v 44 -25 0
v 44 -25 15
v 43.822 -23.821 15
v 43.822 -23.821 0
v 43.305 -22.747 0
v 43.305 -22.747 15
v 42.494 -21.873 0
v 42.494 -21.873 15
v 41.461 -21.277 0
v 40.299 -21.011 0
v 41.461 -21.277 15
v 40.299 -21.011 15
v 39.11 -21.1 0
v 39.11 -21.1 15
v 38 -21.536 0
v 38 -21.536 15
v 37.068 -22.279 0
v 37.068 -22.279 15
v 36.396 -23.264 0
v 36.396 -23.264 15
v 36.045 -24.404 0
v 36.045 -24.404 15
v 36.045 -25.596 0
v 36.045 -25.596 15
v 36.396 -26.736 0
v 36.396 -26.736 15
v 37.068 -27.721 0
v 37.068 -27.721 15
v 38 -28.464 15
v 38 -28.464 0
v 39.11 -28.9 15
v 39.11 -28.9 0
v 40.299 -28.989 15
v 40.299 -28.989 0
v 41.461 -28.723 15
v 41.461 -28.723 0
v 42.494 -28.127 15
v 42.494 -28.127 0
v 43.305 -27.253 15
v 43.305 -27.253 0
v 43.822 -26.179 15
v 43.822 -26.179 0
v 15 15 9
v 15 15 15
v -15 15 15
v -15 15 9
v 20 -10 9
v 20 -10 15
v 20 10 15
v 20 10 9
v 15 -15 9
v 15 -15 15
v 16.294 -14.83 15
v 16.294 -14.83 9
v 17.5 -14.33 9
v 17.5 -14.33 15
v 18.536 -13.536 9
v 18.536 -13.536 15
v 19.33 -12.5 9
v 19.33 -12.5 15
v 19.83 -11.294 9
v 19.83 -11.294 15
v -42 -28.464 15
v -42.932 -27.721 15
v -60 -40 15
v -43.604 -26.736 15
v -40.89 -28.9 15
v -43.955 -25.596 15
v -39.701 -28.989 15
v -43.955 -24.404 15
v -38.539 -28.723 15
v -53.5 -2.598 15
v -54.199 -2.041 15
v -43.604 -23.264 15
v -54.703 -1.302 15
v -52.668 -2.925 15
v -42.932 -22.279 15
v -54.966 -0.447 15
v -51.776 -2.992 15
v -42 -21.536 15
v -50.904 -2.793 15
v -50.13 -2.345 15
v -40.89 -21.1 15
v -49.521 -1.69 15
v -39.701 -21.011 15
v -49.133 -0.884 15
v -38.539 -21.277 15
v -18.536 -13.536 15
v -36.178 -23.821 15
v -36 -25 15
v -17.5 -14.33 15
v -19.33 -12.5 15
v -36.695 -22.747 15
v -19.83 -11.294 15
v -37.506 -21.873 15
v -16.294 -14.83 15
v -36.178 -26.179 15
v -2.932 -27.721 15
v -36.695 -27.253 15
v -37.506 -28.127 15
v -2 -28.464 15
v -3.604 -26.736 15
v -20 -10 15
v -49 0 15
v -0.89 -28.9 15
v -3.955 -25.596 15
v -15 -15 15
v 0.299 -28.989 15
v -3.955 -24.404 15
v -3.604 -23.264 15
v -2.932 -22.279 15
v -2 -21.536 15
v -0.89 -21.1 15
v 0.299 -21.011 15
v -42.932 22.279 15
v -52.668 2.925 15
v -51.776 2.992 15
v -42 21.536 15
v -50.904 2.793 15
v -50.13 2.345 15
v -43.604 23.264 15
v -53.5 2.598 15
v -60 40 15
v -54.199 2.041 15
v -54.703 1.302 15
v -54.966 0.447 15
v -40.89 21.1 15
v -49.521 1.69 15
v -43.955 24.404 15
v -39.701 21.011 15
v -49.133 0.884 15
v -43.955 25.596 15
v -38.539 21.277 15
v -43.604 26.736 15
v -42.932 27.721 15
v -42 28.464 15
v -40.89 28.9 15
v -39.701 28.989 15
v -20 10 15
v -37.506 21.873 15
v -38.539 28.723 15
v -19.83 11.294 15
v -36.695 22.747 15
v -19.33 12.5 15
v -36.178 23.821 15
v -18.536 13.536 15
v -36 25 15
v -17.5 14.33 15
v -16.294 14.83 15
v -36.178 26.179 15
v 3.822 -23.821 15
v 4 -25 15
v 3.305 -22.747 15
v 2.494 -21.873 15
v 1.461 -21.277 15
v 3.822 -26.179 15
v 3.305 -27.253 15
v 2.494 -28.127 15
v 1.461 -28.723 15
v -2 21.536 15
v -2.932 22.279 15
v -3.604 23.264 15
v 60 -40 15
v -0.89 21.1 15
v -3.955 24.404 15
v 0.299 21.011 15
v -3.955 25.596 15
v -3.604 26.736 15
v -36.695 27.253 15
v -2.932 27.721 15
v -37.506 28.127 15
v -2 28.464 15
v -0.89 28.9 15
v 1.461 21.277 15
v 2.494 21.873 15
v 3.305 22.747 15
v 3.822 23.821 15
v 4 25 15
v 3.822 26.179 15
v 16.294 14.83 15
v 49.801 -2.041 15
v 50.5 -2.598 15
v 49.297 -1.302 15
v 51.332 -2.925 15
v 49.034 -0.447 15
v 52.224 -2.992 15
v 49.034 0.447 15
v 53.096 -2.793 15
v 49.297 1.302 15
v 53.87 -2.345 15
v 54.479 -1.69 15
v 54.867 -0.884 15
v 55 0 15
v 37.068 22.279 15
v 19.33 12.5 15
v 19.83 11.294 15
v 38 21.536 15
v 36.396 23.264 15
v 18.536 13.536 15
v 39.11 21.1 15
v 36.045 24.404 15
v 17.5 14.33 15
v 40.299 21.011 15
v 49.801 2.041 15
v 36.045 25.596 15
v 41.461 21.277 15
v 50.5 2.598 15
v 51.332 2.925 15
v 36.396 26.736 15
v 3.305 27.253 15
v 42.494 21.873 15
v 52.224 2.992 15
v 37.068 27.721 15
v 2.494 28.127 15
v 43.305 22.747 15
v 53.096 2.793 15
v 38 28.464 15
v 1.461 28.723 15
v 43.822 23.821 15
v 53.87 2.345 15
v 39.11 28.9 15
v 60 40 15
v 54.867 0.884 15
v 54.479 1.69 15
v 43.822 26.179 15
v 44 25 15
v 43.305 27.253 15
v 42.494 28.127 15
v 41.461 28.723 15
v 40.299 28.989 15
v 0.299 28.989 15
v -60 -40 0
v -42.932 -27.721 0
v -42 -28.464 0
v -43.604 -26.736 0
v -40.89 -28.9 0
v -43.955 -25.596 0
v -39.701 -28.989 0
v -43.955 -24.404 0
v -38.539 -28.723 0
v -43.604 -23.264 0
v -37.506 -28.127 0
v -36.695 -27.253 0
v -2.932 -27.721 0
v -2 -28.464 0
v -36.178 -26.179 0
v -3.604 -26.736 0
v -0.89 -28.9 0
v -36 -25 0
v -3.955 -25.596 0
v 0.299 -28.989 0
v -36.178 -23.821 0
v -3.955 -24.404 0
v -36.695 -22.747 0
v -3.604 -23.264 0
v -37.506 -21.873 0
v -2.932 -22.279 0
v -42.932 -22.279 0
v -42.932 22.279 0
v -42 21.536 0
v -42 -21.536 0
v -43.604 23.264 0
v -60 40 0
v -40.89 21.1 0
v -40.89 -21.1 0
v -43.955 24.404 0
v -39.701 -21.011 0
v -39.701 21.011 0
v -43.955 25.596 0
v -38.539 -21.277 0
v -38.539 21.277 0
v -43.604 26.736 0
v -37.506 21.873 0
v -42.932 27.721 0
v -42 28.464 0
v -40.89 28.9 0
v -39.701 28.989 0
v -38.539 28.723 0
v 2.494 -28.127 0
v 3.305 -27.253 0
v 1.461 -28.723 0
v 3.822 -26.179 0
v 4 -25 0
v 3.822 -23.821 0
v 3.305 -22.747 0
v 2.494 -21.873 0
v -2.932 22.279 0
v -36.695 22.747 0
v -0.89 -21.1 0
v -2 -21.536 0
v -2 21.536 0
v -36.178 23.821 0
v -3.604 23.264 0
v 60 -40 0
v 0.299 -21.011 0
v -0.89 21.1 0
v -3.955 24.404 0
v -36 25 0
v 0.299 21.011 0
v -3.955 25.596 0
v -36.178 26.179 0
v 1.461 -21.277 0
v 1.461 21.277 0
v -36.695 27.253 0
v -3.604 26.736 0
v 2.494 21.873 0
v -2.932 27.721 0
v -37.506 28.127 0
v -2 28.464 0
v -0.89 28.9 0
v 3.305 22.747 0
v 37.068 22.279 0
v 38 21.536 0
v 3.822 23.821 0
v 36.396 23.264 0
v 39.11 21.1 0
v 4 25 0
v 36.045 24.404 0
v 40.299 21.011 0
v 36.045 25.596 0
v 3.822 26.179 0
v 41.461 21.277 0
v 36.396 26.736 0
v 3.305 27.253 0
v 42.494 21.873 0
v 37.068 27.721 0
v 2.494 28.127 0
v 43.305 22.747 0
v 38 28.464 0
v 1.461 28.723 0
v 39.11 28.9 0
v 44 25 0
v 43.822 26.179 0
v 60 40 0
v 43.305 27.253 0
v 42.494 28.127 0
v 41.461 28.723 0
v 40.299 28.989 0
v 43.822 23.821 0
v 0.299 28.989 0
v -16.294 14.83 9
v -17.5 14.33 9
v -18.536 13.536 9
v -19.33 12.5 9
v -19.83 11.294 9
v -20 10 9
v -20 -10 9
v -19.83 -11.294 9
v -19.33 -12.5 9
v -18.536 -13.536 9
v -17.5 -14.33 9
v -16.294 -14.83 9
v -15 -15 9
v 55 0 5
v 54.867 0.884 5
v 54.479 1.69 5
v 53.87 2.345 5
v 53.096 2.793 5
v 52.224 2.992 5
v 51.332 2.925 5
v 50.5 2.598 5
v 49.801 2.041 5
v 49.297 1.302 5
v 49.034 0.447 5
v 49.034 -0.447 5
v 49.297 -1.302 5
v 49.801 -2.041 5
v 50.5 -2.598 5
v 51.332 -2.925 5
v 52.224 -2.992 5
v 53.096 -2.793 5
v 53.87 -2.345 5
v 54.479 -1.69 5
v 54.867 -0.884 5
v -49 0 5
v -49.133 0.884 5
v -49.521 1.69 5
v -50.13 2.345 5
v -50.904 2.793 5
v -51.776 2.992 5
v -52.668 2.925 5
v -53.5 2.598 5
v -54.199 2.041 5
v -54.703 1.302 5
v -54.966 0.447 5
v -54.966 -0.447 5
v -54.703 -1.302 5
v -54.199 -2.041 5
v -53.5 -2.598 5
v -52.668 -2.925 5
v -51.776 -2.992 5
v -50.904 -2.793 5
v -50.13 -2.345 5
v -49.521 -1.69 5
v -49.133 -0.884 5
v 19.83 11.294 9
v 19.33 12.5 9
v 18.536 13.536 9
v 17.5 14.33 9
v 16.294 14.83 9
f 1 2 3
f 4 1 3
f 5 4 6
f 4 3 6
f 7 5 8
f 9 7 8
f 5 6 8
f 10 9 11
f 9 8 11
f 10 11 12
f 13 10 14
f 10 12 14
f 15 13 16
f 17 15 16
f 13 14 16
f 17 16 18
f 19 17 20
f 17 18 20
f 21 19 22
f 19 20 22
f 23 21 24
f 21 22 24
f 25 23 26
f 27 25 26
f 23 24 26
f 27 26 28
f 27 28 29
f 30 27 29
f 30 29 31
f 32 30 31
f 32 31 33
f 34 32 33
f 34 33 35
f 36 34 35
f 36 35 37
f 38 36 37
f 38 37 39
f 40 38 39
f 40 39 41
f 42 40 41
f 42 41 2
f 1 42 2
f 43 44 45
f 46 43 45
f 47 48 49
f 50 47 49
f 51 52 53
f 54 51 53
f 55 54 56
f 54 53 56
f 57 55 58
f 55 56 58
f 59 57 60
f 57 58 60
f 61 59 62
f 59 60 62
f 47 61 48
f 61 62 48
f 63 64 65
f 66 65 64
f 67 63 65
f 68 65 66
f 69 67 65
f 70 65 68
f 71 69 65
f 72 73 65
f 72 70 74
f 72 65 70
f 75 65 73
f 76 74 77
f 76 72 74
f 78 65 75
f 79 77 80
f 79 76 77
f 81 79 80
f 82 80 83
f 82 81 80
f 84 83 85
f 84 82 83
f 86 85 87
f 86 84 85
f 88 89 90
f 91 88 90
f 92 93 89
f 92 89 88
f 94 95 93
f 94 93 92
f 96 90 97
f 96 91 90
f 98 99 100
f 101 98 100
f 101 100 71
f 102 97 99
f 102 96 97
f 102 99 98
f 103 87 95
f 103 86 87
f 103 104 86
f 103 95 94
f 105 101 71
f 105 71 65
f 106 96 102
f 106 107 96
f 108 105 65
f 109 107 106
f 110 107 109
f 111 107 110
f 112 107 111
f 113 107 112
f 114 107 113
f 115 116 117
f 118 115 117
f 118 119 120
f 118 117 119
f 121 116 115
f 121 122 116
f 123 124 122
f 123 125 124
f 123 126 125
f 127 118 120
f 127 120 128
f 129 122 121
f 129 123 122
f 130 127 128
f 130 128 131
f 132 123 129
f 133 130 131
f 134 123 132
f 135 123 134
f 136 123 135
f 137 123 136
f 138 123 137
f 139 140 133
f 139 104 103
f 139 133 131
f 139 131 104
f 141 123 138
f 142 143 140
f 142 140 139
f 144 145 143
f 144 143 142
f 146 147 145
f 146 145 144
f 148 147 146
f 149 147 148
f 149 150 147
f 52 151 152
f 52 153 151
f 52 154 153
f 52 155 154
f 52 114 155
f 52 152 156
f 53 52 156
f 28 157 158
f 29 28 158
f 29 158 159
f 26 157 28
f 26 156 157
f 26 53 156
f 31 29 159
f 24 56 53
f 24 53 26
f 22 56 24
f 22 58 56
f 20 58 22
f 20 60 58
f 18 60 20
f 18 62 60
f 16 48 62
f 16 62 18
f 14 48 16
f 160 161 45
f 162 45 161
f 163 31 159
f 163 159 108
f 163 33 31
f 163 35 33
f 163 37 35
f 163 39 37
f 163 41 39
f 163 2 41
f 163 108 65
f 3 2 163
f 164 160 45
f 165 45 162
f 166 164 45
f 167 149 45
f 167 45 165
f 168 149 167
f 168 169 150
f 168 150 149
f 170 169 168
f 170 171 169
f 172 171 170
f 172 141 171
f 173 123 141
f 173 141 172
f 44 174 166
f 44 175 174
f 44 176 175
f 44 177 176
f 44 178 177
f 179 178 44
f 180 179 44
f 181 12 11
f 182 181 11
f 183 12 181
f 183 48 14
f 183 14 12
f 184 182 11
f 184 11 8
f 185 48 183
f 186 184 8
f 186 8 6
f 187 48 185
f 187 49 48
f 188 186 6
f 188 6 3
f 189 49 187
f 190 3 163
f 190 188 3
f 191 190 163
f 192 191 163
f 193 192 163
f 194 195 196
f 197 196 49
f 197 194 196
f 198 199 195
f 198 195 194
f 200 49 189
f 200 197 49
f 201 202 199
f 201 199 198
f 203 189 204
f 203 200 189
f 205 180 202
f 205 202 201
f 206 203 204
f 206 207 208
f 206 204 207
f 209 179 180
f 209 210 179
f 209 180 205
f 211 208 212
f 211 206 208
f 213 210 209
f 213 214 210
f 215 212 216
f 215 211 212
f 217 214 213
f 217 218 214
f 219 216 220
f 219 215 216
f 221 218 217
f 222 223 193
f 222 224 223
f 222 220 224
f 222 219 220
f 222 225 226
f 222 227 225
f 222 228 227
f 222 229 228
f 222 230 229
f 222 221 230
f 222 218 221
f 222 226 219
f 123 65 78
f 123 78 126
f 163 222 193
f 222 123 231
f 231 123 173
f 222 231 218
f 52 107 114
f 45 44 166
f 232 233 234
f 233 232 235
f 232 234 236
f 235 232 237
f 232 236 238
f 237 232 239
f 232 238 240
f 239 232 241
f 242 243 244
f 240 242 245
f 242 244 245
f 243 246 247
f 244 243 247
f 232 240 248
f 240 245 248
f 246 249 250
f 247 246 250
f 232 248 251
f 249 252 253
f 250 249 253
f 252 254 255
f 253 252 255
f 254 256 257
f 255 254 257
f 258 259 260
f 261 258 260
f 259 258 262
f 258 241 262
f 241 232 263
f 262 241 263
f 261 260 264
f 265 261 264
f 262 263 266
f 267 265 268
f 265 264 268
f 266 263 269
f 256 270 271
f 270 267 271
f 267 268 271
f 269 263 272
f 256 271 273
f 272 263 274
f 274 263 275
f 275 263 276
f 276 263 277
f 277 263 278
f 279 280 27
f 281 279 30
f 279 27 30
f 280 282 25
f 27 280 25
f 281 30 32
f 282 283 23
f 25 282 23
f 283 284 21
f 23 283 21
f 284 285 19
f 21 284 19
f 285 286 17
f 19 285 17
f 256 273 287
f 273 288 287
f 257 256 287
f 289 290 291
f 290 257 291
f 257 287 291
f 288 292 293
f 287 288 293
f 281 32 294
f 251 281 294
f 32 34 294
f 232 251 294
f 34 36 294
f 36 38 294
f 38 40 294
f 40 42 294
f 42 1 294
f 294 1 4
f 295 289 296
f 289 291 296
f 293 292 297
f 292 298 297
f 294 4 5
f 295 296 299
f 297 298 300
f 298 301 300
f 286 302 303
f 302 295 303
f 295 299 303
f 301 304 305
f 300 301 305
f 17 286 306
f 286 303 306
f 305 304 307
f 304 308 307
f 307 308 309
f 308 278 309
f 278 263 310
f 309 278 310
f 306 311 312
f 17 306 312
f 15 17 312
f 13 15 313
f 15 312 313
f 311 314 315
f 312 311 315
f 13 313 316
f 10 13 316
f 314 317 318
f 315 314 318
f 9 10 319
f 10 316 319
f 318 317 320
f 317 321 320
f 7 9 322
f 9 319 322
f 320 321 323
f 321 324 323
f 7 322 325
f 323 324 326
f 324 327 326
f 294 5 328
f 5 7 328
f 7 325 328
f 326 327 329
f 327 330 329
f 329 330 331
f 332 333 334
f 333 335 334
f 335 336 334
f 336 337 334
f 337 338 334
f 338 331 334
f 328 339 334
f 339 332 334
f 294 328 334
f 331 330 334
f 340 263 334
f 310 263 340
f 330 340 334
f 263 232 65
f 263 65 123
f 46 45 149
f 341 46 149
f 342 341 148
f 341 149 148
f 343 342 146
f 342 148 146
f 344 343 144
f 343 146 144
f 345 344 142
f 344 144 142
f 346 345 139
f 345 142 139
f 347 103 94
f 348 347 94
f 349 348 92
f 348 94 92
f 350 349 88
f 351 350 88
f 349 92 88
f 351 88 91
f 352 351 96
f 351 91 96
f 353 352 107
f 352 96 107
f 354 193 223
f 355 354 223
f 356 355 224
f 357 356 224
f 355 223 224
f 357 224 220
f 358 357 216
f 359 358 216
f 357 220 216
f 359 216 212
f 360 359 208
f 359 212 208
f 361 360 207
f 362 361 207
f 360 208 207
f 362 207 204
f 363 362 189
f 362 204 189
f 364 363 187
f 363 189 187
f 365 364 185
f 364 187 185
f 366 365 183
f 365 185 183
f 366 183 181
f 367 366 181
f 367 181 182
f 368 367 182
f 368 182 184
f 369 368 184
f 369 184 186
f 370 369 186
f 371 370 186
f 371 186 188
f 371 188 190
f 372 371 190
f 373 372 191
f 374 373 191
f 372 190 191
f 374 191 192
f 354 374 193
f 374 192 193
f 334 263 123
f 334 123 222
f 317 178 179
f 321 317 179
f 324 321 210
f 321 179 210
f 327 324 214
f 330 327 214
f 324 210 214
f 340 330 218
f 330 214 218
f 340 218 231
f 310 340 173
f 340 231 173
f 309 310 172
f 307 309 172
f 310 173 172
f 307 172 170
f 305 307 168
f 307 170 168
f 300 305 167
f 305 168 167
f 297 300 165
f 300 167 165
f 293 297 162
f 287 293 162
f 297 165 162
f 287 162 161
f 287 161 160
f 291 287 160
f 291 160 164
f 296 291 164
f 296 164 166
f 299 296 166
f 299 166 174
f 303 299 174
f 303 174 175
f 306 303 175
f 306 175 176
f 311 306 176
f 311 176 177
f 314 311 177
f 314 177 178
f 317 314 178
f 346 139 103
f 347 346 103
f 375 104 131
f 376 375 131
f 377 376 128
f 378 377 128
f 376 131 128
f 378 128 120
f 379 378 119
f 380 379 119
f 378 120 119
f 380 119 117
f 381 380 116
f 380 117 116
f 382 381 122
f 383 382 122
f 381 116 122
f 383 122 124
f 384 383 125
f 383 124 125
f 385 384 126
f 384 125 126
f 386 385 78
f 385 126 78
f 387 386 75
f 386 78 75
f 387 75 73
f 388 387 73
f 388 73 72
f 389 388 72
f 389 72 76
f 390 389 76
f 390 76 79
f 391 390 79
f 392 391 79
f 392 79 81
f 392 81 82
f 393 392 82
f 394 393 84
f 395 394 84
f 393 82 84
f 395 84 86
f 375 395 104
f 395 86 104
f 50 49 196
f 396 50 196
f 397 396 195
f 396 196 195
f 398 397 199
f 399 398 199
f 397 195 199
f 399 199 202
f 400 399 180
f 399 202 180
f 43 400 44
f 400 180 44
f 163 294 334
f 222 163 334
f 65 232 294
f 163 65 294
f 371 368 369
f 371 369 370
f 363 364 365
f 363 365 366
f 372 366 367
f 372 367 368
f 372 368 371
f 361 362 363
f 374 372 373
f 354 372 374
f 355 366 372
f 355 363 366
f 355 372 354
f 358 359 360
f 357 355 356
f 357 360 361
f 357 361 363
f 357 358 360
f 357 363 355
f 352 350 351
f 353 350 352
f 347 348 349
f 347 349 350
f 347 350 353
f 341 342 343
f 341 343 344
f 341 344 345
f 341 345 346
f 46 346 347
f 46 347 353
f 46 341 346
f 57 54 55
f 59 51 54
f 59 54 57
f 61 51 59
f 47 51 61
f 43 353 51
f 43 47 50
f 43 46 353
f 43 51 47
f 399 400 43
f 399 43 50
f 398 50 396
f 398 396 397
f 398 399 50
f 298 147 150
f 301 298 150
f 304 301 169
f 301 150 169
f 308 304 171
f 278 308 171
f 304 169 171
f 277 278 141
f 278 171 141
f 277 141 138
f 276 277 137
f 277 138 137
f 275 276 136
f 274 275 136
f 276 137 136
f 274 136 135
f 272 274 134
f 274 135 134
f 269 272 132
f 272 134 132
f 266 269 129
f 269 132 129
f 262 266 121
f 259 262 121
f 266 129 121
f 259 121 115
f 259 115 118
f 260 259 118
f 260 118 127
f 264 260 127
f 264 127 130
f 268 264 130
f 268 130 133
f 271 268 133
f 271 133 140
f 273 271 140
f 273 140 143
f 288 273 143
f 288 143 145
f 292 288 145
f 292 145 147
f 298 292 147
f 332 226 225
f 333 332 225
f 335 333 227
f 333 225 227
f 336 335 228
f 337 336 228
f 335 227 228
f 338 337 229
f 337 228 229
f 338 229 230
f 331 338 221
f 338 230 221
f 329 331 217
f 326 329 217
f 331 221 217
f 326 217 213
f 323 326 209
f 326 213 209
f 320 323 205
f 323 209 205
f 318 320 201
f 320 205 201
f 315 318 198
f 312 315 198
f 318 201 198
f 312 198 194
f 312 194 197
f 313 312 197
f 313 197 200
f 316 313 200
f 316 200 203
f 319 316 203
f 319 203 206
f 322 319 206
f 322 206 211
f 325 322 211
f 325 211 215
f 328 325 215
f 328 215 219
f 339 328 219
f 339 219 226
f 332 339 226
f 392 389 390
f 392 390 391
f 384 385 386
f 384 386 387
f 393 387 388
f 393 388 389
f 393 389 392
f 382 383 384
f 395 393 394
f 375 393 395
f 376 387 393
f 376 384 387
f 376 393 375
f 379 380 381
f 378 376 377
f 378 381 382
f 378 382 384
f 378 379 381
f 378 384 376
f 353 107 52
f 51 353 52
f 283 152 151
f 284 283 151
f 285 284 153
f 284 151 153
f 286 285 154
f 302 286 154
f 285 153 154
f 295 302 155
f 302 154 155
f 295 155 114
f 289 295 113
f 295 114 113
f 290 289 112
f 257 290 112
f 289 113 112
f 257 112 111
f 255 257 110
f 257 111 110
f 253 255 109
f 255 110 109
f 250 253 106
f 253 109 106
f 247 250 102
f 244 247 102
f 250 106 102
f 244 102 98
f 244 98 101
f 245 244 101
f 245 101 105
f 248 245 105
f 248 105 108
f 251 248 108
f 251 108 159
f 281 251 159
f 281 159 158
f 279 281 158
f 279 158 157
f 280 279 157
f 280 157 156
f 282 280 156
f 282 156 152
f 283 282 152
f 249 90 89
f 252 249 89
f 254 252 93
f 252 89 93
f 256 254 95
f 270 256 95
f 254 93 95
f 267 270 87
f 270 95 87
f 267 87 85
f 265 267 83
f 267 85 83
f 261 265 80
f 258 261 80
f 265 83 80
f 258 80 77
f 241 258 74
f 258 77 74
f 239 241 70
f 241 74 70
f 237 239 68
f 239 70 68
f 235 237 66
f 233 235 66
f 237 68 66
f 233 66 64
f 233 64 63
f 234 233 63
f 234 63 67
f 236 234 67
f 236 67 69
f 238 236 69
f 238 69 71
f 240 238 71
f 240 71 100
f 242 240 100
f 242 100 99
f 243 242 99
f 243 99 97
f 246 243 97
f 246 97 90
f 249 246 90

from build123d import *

# Parameters (mm, degrees)
SKETCH_1_W          = 120
SKETCH_1_H          = 80
EXTRUDE_1_DEPTH     = 15
CUT_EXTRUDE_1_DEPTH = 6
SKETCH_3_R          = 4
CUT_EXTRUDE_2_DEPTH = 74.654599313
SKETCH_4_R          = 3
CUT_EXTRUDE_3_DEPTH = 10


with BuildPart() as part:
    # 草图1 → 凸台-拉伸1 (new body)
    with BuildSketch(Plane.XY):
        Rectangle(SKETCH_1_W, SKETCH_1_H)
    extrude(amount=EXTRUDE_1_DEPTH)

    # 草图2 → 切除-拉伸1 (cut)
    with BuildSketch(Plane.XY.offset(15)):
        with BuildLine():
            Line((-15, -15), (15, -15))
            ThreePointArc((15, -15), (18.535533906, -13.535533906), (20, -10))
            Line((20, -10), (20, 10))
            ThreePointArc((20, 10), (18.535533906, 13.535533906), (15, 15))
            Line((15, 15), (-15, 15))
            ThreePointArc((-15, 15), (-18.535533906, 13.535533906), (-20, 10))
            Line((-20, 10), (-20, -10))
            ThreePointArc((-20, -10), (-18.535533906, -13.535533906), (-15, -15))
        make_face()
    extrude(amount=-CUT_EXTRUDE_1_DEPTH, mode=Mode.SUBTRACT)

    # 草图3 → 切除-拉伸2 (cut, through all)
    with BuildSketch(Plane.XY.offset(15)):
        with Locations((0, 25)):
            Circle(SKETCH_3_R)
        with Locations((0, -25)):
            Circle(SKETCH_3_R)
        with Locations((40, 25)):
            Circle(SKETCH_3_R)
        with Locations((40, -25)):
            Circle(SKETCH_3_R)
        with Locations((-40, 25)):
            Circle(SKETCH_3_R)
        with Locations((-40, -25)):
            Circle(SKETCH_3_R)
    extrude(amount=-CUT_EXTRUDE_2_DEPTH, mode=Mode.SUBTRACT)

    # 草图4 → 切除-拉伸3 (cut)
    with BuildSketch(Plane.XY.offset(15)):
        with Locations((52, 0)):
            Circle(SKETCH_4_R)
        with Locations((-52, 0)):
            Circle(SKETCH_4_R)
    extrude(amount=-CUT_EXTRUDE_3_DEPTH, mode=Mode.SUBTRACT)


solid = part.part
